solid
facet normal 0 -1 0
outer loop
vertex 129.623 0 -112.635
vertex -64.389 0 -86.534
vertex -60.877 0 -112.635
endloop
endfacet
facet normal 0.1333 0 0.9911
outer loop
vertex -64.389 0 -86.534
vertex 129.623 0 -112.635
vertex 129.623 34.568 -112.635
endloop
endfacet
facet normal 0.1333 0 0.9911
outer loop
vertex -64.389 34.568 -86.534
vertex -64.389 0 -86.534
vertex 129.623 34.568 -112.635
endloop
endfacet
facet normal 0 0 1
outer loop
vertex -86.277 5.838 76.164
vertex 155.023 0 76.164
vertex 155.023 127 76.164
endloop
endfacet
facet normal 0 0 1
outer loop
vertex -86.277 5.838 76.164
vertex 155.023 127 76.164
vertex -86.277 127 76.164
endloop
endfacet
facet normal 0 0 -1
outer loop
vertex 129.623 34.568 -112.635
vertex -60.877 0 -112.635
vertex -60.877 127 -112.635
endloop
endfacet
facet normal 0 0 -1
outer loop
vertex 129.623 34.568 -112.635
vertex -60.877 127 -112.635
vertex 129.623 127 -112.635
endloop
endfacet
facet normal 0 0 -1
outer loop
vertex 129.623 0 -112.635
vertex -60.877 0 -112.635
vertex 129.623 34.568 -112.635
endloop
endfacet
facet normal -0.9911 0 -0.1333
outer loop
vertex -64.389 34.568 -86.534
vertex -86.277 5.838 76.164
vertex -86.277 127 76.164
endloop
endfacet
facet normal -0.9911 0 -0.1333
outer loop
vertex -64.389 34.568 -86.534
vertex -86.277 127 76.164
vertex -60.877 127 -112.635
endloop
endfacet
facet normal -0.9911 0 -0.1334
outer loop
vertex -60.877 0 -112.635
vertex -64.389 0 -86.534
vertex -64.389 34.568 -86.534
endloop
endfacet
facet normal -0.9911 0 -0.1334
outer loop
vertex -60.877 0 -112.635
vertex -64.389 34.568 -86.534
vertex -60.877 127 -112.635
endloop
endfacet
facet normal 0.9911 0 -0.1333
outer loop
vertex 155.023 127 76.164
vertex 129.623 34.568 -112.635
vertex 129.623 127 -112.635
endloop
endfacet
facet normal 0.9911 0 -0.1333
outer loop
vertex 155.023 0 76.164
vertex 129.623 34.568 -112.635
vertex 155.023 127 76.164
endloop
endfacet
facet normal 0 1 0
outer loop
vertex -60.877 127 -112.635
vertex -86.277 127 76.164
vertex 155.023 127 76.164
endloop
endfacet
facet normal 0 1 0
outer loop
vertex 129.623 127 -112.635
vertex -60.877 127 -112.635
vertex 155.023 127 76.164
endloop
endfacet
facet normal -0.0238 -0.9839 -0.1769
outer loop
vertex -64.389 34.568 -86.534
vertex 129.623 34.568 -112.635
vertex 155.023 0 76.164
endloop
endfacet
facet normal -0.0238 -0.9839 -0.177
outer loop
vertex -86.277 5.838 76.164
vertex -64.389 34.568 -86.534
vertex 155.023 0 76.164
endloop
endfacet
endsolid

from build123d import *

# Parameters (mm, degrees)
F1_DEPTH = 127
F3_DEPTH = 241.3


with BuildPart() as f1:
    # F0 (on Front) → F1 (new body)
    with BuildSketch(Plane.XZ):
        Polygon((155.0226134762, 76.1641544679), (-86.2773865238, 76.1641544679), (-60.8773865238, -112.634918623), (129.6226134762, -112.634918623), align=None)
    extrude(amount=-F1_DEPTH)

    # F2 (on face) → F3 (cut)
    with BuildSketch(Plane(origin=(142.2021087352, 0, -19.131097959), x_dir=(0, 1, 0), z_dir=(0.9910712498, 0, -0.1333333333))):
        Polygon((34.5675349236, -94.3462144431), (0, 96.1537855569), (0, -94.3462144431), align=None)
    extrude(amount=-F3_DEPTH, mode=Mode.SUBTRACT)


solid = f1.part
